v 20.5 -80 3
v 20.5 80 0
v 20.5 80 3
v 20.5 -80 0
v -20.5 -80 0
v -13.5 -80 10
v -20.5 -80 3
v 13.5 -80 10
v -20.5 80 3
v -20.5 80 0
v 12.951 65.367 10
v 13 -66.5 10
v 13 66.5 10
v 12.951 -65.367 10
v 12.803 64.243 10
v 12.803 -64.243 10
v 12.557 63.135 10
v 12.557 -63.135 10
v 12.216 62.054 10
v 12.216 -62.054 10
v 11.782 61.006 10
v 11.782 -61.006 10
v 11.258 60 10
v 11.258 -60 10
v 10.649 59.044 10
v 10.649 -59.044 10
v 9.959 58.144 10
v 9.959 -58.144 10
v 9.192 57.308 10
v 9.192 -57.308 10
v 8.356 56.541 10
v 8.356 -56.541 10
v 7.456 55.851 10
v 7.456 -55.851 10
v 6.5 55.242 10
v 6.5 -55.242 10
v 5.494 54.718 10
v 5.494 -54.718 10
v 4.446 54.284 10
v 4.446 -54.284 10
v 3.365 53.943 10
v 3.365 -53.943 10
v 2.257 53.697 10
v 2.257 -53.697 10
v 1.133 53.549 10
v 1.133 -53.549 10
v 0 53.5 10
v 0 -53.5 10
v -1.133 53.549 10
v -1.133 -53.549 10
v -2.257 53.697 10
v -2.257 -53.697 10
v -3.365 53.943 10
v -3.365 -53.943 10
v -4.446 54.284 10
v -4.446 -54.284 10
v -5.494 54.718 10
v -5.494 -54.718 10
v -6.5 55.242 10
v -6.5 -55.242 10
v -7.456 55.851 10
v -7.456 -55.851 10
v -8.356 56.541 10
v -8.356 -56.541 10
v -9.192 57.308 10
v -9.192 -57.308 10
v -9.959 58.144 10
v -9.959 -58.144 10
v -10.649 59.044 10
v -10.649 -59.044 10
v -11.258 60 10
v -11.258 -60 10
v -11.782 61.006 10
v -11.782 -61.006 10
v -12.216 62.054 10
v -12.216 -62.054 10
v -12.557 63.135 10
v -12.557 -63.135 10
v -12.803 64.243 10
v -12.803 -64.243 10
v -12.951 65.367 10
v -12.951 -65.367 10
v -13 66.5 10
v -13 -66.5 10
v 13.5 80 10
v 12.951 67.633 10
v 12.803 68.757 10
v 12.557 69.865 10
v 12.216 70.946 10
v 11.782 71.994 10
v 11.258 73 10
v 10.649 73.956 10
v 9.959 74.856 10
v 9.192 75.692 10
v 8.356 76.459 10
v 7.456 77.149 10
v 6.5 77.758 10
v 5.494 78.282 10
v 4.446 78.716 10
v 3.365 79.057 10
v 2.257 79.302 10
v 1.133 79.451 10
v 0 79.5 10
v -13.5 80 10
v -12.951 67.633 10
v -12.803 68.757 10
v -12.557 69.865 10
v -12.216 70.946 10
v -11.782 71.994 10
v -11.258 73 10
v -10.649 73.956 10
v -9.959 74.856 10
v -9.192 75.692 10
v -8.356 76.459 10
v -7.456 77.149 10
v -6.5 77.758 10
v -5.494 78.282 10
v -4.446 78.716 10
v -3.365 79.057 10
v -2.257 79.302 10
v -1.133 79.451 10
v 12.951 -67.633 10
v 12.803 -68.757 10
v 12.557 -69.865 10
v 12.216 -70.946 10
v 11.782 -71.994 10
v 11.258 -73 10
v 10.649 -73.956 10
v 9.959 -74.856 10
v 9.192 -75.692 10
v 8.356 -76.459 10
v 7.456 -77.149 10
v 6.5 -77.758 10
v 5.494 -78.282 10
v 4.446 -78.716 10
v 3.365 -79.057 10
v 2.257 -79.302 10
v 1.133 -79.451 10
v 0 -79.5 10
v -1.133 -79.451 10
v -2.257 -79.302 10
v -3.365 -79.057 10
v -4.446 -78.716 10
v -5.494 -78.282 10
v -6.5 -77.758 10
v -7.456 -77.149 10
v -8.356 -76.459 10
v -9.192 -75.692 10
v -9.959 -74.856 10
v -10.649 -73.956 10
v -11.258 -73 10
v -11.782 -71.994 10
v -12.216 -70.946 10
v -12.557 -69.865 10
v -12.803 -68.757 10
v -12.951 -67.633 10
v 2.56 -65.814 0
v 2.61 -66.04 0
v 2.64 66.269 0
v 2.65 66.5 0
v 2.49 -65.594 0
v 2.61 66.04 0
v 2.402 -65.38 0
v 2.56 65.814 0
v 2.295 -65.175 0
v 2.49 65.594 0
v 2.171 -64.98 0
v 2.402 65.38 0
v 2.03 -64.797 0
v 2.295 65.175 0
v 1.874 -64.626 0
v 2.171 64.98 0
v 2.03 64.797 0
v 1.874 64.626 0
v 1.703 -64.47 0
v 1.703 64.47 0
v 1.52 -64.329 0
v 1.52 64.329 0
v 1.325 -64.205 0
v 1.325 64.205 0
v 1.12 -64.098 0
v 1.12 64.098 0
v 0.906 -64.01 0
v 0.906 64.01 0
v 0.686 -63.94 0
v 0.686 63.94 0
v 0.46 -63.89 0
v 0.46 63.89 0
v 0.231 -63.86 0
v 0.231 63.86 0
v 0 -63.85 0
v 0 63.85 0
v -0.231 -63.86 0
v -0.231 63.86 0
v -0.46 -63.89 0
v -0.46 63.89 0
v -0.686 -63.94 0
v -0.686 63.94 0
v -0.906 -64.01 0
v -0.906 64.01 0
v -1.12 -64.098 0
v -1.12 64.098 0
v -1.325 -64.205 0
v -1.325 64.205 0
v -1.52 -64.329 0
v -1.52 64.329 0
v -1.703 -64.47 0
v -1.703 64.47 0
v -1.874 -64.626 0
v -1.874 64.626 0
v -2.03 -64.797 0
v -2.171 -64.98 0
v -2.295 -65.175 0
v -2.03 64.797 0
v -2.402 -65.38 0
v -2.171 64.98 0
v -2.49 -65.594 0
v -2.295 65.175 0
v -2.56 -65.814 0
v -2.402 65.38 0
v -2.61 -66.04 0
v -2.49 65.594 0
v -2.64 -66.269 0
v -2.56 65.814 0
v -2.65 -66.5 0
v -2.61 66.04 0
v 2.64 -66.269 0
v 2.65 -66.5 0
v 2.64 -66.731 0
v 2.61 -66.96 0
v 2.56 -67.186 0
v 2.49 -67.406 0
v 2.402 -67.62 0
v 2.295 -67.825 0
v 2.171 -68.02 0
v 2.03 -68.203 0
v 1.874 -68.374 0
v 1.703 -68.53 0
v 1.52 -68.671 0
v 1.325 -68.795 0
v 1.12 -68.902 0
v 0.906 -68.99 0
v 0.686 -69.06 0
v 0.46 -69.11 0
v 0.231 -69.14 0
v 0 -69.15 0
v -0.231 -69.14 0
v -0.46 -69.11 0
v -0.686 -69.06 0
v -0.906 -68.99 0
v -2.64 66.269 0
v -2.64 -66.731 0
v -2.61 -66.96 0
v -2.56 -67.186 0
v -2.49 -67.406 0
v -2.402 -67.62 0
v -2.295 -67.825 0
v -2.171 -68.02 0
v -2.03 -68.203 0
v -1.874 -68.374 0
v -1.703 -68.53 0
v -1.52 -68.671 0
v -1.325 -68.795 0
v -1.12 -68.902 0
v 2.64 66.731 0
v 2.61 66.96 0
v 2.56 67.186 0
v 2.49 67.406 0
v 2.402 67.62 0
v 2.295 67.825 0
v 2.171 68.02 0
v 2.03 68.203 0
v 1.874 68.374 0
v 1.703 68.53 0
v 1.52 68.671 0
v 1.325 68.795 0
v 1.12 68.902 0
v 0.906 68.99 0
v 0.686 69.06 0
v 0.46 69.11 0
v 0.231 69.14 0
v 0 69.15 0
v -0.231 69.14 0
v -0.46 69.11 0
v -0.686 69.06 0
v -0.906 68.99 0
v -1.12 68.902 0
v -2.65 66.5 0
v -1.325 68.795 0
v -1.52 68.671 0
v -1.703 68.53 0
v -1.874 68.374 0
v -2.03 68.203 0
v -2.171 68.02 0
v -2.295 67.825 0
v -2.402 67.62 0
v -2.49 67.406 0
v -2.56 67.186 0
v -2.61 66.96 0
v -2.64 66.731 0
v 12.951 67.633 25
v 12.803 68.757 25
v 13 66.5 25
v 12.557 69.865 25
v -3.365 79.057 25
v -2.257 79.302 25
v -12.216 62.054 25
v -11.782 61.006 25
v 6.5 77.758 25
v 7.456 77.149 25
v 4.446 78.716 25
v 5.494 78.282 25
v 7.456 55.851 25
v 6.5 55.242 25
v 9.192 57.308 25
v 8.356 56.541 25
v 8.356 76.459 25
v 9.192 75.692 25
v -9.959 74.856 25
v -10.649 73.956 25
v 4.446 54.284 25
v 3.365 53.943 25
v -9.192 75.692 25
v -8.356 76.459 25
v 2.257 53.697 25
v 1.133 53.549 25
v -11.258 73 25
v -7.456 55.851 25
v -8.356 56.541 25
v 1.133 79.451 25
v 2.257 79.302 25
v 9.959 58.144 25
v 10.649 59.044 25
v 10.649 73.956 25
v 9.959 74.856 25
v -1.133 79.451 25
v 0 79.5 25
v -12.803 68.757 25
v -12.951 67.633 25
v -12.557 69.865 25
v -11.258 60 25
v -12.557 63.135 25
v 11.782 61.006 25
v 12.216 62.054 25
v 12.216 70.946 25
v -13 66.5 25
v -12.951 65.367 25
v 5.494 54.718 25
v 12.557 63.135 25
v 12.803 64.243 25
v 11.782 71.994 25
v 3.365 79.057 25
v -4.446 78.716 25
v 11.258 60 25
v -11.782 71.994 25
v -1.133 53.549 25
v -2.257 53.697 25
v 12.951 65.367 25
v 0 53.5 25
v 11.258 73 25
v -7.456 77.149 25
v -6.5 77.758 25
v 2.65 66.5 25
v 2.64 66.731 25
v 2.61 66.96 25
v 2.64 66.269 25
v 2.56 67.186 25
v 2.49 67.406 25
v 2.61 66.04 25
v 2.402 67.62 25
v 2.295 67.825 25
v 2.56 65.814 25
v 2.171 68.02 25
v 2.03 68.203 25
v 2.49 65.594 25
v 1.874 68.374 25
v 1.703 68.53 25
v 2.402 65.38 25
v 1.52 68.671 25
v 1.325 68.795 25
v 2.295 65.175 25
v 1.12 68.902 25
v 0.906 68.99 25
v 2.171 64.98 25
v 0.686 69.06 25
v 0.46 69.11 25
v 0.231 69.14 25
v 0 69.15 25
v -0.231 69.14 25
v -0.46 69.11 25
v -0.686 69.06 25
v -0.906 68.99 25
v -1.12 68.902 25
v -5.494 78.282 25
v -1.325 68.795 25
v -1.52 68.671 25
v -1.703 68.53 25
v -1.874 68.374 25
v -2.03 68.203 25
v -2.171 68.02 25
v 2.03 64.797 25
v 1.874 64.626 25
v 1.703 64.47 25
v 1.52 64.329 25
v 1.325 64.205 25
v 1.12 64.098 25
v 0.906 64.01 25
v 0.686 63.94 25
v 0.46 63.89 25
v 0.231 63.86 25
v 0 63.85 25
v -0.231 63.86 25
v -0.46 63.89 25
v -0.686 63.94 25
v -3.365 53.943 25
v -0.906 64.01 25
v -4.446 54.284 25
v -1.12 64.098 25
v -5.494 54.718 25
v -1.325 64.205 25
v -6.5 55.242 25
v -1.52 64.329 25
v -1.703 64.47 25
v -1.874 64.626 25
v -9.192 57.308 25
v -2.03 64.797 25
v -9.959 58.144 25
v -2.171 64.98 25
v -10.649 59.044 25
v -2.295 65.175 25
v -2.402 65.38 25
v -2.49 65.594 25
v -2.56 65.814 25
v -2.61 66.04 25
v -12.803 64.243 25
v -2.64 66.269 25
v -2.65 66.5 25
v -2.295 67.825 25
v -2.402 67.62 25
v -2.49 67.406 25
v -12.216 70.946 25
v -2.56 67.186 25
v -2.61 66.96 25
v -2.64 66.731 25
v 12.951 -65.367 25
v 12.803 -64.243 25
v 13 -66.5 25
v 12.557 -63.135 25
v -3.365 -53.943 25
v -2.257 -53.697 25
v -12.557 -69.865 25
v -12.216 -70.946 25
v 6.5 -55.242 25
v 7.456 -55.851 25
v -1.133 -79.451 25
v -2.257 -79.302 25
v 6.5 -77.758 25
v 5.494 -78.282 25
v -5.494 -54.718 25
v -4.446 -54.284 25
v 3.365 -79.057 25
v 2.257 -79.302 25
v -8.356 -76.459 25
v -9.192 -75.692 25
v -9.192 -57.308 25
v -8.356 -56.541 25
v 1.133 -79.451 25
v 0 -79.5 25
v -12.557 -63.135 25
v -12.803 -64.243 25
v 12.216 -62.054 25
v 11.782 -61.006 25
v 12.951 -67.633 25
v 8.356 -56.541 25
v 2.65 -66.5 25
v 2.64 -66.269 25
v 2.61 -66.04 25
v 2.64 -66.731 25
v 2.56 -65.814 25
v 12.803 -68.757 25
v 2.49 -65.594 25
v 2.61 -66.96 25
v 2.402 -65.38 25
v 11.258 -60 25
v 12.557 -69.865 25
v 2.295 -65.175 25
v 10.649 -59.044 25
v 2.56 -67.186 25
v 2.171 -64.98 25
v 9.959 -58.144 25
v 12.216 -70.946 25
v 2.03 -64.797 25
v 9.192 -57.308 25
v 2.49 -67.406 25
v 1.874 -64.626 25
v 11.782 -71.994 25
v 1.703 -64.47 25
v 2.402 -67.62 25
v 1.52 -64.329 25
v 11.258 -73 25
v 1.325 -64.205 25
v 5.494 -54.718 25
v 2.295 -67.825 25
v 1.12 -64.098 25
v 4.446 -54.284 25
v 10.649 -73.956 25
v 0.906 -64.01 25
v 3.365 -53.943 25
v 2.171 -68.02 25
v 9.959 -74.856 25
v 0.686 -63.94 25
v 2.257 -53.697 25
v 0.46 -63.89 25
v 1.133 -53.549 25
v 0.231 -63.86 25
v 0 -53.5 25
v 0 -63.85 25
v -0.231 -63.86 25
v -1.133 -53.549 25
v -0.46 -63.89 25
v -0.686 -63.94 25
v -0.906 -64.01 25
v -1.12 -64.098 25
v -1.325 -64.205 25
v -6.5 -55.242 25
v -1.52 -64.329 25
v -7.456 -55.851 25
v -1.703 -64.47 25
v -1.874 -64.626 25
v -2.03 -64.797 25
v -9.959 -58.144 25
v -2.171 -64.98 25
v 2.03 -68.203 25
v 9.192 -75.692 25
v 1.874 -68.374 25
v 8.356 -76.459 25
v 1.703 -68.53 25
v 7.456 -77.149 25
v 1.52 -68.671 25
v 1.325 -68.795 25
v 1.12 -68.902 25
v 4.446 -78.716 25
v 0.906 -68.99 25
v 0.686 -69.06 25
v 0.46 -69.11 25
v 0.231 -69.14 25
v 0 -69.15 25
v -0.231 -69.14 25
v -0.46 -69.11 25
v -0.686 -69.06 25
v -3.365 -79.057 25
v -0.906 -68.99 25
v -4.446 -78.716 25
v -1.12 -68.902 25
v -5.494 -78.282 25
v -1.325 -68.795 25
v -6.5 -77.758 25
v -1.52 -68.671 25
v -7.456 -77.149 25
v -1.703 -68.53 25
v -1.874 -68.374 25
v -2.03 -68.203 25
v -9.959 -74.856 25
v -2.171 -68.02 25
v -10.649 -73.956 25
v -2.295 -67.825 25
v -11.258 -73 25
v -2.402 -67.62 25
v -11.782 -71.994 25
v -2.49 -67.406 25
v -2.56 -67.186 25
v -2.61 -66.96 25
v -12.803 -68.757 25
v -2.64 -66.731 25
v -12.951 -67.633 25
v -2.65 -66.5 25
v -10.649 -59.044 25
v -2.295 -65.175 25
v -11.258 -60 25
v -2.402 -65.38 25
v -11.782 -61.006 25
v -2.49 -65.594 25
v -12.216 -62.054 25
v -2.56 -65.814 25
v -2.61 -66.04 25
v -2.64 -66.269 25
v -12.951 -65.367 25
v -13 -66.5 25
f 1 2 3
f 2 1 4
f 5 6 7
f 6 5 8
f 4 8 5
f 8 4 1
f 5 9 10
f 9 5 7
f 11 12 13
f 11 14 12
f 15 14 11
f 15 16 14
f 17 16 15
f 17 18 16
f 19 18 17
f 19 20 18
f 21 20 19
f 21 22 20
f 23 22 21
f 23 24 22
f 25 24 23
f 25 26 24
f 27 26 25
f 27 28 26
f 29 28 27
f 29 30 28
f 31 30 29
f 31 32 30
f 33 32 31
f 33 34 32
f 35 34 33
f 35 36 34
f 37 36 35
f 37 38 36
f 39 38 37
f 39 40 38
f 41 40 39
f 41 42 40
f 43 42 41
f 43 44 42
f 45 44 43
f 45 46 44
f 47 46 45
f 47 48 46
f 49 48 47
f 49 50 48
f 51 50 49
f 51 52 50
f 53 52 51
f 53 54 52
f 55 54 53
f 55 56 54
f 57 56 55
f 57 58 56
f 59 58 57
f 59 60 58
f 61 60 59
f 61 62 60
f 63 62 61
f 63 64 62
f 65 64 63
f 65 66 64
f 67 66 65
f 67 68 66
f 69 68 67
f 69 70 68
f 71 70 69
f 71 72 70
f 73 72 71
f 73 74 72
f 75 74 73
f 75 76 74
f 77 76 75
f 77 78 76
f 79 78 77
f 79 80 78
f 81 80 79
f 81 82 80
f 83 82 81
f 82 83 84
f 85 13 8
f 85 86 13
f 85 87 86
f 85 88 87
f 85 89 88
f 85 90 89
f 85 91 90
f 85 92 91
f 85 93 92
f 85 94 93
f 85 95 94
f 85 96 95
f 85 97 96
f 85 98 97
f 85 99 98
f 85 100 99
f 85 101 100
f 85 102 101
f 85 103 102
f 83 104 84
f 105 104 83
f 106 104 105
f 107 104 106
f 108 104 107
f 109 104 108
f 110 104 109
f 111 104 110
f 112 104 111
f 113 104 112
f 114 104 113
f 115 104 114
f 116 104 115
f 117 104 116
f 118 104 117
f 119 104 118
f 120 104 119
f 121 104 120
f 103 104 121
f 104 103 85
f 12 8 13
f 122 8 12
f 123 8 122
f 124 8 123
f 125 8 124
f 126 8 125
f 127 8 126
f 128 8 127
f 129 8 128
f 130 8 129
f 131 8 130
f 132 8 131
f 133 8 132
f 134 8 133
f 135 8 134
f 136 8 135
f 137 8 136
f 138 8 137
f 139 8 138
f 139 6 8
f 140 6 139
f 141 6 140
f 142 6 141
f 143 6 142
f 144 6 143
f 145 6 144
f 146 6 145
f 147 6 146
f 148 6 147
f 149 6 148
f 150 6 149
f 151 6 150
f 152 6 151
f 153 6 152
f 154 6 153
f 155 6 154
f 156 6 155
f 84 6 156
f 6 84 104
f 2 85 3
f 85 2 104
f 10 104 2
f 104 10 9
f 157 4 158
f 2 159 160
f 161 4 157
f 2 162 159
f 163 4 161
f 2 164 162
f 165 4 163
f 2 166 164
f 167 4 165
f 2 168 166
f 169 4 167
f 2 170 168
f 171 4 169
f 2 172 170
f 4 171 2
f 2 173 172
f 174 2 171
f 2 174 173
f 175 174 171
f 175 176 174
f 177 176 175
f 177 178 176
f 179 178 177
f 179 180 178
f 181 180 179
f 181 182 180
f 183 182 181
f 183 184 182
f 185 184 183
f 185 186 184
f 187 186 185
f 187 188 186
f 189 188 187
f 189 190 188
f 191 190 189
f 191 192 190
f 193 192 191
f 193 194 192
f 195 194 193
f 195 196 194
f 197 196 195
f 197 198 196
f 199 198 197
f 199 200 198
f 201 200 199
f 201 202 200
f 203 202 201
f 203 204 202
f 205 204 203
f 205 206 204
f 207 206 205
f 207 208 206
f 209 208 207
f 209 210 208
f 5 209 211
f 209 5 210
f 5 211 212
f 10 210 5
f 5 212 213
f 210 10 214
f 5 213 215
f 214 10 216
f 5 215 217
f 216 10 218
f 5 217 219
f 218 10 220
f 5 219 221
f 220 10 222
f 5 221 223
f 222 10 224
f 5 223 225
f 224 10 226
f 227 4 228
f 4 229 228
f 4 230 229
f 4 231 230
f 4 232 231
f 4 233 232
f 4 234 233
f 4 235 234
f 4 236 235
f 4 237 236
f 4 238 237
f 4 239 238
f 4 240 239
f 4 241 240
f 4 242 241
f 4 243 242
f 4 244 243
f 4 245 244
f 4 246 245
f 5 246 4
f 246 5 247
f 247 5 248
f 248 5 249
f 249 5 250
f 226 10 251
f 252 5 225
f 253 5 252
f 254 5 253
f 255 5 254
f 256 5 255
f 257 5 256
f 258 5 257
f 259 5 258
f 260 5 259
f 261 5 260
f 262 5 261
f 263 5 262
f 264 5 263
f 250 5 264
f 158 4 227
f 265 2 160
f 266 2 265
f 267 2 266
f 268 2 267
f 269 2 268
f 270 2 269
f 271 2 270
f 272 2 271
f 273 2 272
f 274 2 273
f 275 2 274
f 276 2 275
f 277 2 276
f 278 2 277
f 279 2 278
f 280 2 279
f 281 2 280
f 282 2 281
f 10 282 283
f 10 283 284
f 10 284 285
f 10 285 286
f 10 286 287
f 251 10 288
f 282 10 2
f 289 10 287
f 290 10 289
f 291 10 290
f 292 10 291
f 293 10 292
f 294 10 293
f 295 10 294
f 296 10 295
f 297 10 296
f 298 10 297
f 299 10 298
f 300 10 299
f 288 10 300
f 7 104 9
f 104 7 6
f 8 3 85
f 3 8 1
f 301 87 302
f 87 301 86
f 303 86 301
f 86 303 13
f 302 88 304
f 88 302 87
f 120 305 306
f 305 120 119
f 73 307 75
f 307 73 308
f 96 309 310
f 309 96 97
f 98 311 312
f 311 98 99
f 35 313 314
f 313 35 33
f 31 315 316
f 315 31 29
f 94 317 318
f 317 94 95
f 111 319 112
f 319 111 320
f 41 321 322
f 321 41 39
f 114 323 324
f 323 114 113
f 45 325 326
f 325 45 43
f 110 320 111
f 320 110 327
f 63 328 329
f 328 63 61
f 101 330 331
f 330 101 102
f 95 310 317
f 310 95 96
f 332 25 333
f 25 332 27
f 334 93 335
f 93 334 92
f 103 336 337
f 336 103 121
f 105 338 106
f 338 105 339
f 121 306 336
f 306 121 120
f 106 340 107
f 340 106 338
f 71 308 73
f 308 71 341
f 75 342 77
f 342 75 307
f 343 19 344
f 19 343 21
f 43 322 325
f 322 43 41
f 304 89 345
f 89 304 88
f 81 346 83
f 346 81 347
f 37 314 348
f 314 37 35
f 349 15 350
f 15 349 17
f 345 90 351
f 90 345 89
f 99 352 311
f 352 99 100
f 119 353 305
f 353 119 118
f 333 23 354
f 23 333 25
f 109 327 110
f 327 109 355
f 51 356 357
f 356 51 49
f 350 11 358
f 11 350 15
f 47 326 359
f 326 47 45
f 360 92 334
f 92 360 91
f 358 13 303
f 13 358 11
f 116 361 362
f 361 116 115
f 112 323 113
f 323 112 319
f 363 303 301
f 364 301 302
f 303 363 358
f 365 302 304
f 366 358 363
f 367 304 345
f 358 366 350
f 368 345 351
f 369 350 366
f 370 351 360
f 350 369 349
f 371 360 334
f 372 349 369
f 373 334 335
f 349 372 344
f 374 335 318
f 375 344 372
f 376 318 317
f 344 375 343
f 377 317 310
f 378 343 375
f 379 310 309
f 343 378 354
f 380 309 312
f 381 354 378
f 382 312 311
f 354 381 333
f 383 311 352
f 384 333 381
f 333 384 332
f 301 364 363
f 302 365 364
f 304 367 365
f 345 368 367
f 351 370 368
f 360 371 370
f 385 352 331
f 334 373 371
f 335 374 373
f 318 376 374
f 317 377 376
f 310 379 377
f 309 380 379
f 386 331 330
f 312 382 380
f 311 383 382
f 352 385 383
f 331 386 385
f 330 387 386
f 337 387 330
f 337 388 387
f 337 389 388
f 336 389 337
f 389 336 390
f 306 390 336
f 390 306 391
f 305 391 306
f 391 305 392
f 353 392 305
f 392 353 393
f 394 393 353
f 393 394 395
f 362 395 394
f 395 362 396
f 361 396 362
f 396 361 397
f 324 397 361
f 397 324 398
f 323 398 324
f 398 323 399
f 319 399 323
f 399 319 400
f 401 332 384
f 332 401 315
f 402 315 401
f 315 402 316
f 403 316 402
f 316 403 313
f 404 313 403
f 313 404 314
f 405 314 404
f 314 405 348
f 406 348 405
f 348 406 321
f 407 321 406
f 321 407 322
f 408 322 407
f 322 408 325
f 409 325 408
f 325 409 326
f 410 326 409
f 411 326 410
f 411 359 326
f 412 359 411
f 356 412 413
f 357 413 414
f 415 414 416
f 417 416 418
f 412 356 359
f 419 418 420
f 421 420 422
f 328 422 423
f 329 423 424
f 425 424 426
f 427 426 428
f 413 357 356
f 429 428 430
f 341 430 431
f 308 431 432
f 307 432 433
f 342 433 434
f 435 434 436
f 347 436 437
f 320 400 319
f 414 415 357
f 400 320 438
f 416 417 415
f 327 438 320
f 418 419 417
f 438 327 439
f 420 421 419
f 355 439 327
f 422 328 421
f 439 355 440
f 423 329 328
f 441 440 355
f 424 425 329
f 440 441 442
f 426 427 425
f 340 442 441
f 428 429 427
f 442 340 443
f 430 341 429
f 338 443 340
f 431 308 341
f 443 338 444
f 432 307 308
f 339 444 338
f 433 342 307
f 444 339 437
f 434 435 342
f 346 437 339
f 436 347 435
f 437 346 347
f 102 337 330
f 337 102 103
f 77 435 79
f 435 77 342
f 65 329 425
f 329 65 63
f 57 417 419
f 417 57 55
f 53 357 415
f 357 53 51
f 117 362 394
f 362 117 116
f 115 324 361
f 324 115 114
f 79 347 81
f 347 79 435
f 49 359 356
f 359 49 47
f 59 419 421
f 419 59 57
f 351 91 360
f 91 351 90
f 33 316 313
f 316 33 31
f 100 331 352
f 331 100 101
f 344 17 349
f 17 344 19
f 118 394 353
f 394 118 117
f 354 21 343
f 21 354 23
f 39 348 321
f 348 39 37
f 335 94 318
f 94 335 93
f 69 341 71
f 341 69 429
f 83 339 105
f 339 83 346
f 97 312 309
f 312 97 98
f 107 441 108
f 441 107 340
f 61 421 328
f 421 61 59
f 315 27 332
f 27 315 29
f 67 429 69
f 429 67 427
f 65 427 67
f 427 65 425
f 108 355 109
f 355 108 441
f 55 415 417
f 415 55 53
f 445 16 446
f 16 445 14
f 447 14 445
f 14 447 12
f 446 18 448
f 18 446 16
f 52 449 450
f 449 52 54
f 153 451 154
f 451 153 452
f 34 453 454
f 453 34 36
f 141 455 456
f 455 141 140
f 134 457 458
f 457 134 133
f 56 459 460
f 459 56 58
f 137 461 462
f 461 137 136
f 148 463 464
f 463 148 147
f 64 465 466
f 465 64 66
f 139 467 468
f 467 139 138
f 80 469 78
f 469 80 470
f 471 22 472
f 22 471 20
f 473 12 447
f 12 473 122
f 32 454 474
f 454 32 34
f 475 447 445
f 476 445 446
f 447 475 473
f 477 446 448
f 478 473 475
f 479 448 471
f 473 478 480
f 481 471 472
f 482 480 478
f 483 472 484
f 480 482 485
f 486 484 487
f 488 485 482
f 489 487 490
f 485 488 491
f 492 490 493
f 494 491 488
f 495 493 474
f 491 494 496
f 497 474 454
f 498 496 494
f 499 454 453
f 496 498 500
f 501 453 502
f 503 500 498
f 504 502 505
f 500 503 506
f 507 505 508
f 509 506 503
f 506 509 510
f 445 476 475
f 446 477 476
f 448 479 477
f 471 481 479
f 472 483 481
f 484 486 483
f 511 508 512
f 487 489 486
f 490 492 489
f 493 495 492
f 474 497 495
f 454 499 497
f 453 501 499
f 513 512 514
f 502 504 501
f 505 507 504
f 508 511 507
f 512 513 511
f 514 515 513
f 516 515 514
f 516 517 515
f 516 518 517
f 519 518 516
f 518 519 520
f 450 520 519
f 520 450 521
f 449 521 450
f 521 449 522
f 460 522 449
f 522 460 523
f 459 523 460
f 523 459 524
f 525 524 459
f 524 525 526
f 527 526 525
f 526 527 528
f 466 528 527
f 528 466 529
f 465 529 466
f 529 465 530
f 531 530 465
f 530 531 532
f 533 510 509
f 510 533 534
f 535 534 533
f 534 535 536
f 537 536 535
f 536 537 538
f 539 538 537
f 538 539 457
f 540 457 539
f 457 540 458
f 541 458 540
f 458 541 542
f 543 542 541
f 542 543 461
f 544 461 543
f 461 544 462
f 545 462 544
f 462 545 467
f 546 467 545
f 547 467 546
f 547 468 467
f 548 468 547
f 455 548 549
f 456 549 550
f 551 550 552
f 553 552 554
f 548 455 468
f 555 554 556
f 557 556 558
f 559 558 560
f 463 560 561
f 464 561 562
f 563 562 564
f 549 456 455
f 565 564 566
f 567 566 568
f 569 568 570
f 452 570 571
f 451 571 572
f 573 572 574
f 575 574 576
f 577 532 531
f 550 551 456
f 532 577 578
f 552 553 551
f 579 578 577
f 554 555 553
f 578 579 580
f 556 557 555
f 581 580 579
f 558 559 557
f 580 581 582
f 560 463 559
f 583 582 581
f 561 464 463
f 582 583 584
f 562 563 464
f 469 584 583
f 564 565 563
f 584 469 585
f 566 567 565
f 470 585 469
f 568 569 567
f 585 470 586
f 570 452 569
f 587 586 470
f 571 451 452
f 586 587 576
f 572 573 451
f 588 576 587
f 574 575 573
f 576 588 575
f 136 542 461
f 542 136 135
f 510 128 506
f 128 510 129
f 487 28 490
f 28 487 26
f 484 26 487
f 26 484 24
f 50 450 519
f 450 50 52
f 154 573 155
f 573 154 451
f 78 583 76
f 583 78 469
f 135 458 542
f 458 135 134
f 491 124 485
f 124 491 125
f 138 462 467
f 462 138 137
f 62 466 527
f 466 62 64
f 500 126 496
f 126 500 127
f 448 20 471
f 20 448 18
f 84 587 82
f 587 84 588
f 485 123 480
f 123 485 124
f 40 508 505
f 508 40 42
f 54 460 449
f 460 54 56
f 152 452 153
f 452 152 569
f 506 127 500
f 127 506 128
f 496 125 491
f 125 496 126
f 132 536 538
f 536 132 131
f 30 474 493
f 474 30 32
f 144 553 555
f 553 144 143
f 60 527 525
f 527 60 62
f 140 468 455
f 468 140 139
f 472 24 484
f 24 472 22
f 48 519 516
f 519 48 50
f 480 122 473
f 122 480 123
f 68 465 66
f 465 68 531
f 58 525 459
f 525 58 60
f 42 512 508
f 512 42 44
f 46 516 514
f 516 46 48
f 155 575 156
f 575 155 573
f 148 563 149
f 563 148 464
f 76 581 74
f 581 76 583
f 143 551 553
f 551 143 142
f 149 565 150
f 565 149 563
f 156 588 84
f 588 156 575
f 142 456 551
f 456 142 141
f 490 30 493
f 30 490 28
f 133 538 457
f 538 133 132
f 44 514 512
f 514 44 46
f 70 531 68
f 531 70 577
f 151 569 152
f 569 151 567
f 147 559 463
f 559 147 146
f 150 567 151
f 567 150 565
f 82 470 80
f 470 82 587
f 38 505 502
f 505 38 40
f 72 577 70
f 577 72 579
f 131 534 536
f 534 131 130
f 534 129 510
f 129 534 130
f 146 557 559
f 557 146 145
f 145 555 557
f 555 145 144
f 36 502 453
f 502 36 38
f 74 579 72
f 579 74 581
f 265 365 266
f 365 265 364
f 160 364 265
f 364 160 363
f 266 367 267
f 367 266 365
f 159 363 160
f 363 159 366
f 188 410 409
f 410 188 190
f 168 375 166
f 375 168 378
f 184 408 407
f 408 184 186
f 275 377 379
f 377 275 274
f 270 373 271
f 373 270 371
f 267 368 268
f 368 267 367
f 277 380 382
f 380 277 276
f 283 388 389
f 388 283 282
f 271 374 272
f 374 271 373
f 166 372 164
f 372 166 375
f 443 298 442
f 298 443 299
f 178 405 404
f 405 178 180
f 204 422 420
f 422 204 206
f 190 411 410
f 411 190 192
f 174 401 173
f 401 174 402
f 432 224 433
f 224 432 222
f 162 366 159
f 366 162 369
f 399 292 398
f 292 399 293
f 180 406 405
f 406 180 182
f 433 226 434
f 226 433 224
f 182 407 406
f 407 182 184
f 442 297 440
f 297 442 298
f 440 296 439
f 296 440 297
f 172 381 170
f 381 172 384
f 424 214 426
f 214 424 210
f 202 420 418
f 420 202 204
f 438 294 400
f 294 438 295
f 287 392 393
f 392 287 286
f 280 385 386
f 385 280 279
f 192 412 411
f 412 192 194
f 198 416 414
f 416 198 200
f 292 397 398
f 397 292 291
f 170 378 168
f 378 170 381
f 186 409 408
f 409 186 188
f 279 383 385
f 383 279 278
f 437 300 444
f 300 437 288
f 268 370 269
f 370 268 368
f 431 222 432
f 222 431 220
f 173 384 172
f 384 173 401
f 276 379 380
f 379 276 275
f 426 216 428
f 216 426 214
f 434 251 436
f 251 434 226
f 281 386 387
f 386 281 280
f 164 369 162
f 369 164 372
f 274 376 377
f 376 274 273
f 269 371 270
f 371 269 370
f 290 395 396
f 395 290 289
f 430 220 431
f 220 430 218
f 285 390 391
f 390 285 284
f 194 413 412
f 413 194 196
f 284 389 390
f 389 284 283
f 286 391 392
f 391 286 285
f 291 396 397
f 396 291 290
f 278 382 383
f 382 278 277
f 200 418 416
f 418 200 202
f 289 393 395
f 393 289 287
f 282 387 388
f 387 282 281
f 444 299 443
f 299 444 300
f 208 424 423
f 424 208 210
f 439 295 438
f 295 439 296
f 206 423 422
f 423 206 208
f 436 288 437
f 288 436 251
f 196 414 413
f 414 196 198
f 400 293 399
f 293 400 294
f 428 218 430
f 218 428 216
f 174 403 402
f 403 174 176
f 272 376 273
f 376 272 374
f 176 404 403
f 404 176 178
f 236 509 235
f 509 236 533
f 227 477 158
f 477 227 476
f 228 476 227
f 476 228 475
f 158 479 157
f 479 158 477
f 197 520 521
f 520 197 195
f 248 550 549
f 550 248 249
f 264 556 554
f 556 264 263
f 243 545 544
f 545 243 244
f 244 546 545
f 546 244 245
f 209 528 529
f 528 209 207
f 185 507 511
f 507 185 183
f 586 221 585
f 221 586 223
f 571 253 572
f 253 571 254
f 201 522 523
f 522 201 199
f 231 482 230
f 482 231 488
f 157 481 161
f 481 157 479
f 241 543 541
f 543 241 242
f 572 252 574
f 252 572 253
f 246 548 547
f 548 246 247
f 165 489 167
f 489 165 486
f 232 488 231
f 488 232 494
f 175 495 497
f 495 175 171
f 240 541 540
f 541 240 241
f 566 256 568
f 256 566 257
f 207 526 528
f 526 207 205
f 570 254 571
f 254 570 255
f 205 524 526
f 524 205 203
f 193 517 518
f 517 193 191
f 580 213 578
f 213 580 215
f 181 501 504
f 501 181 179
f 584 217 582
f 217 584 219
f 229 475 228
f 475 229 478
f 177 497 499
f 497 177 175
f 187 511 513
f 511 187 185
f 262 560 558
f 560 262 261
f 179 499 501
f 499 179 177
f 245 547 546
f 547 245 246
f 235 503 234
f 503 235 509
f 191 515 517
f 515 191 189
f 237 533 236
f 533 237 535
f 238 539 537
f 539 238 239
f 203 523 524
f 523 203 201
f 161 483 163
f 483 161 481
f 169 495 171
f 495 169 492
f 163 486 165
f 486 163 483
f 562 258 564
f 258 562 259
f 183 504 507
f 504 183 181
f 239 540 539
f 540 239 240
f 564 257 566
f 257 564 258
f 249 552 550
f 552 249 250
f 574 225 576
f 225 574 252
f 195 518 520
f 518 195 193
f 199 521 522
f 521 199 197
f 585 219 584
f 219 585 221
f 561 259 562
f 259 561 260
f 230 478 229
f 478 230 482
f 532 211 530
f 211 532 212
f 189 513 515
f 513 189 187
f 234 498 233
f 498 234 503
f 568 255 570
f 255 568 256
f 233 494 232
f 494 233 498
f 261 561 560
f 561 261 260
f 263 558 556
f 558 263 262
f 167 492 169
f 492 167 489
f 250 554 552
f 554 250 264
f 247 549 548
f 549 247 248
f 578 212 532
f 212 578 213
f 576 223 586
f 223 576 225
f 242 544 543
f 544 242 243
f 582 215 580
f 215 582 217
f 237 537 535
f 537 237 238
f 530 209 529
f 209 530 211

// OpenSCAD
// QUEUE D'ARONDE ARKA-SWISS POUR TREPIED ULANZI VIDEO OMBRA
// Pierre REVEL 15/06/24
//
// Projet lunette PVC 60 mm DIY
// Spécifiquement conçue pour les colliers pour tubes diamètre 63 et leurs vis de fixation murale 30 mm

$fn=72;

longueur=160;   // Longueur queue d'aronde
ecart=133;      // Ecart entre les colliers
trouvis=5.3;    // Diamètre des trous

module matiere() {
  union() {
    translate([-20.5,0,0]) rotate([90,0,0]) linear_extrude(height=longueur,center=true) polygon(points=[[0,0],[0,3],[7,10],[34,10],[41,3],[41,0]]);
    translate([0,ecart/2,0]) cylinder(h=25,r=13);
    translate([0,-ecart/2,0])  cylinder(h=25,r=13);
  }
}

module percage() {
  translate([0,ecart/2,-10]) cylinder(h=45,d=trouvis);
  translate([0,-ecart/2,-10])  cylinder(h=45,d=trouvis);
}

difference() {
  matiere();
  percage();
}
